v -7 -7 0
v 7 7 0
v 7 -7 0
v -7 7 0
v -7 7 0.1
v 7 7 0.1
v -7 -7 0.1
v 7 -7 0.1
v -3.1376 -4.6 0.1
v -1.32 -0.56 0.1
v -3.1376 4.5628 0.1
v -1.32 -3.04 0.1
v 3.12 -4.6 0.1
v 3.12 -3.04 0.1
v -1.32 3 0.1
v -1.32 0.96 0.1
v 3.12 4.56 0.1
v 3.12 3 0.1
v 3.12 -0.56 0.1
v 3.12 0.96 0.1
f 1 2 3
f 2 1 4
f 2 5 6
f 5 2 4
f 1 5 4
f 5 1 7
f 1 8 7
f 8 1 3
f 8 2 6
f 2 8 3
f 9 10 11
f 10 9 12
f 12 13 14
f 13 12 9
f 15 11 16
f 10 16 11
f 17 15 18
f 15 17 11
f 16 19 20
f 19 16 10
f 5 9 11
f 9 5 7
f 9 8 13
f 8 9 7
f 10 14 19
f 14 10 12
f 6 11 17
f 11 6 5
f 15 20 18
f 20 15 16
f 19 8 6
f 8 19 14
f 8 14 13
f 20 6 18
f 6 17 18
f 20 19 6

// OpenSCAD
// file: ../p/4-4edge.scad
use <../lib.scad>
$fa=1; $fs=0.2;
function ldraw_lib__4_4edge(realsolid=false) = [
// 0 Circle 1.0
// 0 Name: 4-4edge.dat
// 0 Author: James Jessiman
// 0 !LDRAW_ORG Primitive UPDATE 2017-01
// 0 !LICENSE Licensed under CC BY 2.0 and CC BY 4.0 : see CAreadme.txt
// 
// 0 BFC CERTIFY CCW
  [0,"BFC","CERTIFY"],
  [0,"BFC","CCW"],
// 
// 0 !HISTORY 1998-12-15 [PTadmin] Official Update 1998-10
// 0 !HISTORY 2005-12-28 [PTadmin] Official Update 2005-01
// 0 !HISTORY 2007-06-24 [PTadmin] Header formatted for Contributor Agreement
// 0 !HISTORY 2008-07-01 [PTadmin] Official Update 2008-01
// 0 !HISTORY 2017-01-15 [Steffen] BFCed
// 0 !HISTORY 2017-12-30 [PTadmin] Official Update 2017-01
// 
// 
// 2 24 1 0 0 0.9239 0 0.3827
  [2,24,1,0,0,0.9239,0,0.3827],
// 2 24 0.9239 0 0.3827 0.7071 0 0.7071
  [2,24,0.9239,0,0.3827,0.7071,0,0.7071],
// 2 24 0.7071 0 0.7071 0.3827 0 0.9239
  [2,24,0.7071,0,0.7071,0.3827,0,0.9239],
// 2 24 0.3827 0 0.9239 0 0 1
  [2,24,0.3827,0,0.9239,0,0,1],
// 2 24 0 0 1 -0.3827 0 0.9239
  [2,24,0,0,1,-0.3827,0,0.9239],
// 2 24 -0.3827 0 0.9239 -0.7071 0 0.7071
  [2,24,-0.3827,0,0.9239,-0.7071,0,0.7071],
// 2 24 -0.7071 0 0.7071 -0.9239 0 0.3827
  [2,24,-0.7071,0,0.7071,-0.9239,0,0.3827],
// 2 24 -0.9239 0 0.3827 -1 0 -0
  [2,24,-0.9239,0,0.3827,-1,0,-0],
// 2 24 -1 0 -0 -0.9239 0 -0.3827
  [2,24,-1,0,-0,-0.9239,0,-0.3827],
// 2 24 -0.9239 0 -0.3827 -0.7071 0 -0.7071
  [2,24,-0.9239,0,-0.3827,-0.7071,0,-0.7071],
// 2 24 -0.7071 0 -0.7071 -0.3827 0 -0.9239
  [2,24,-0.7071,0,-0.7071,-0.3827,0,-0.9239],
// 2 24 -0.3827 0 -0.9239 0 0 -1
  [2,24,-0.3827,0,-0.9239,0,0,-1],
// 2 24 0 0 -1 0.3827 0 -0.9239
  [2,24,0,0,-1,0.3827,0,-0.9239],
// 2 24 0.3827 0 -0.9239 0.7071 0 -0.7071
  [2,24,0.3827,0,-0.9239,0.7071,0,-0.7071],
// 2 24 0.7071 0 -0.7071 0.9239 0 -0.3827
  [2,24,0.7071,0,-0.7071,0.9239,0,-0.3827],
// 2 24 0.9239 0 -0.3827 1 0 0
  [2,24,0.9239,0,-0.3827,1,0,0],
];
module ldraw_lib__4_4edge(step=0, col=false, unit=2/5, alt=false, line=0.2, solid=!$preview)
    makepoly(ldraw_lib__4_4edge(solid), step=step, col=col, unit=unit, alt=alt, line=line, solid=solid);
ldraw_lib__4_4edge(line=0.2);
// file: ../p/4-4disc.scad
use <../lib.scad>
$fa=1; $fs=0.2;
function ldraw_lib__4_4disc(realsolid=false) = [
// 0 Disc 1.0
// 0 Name: 4-4disc.dat
// 0 Author: James Jessiman
// 0 !LDRAW_ORG Primitive UPDATE 2002-02
// 0 !LICENSE Licensed under CC BY 2.0 and CC BY 4.0 : see CAreadme.txt
// 
// 0 BFC CERTIFY CCW
  [0,"BFC","CERTIFY"],
  [0,"BFC","CCW"],
// 
// 0 !HISTORY 1998-12-15 [PTadmin] Official Update 1998-10
// 0 !HISTORY 2002-03-23 [sbliss] Added BFC statement
// 0 !HISTORY 2002-04-25 [PTadmin] Official Update 2002-02
// 0 !HISTORY 2007-06-24 [PTadmin] Header formatted for Contributor Agreement
// 0 !HISTORY 2008-07-01 [PTadmin] Official Update 2008-01
// 
// 
// 3 16 0 0 0 1 0 0 0.9239 0 0.3827
  [3,16,0,0,0,1,0,0,0.9239,0,0.3827],
// 3 16 0 0 0 0.9239 0 0.3827 0.7071 0 0.7071
  [3,16,0,0,0,0.9239,0,0.3827,0.7071,0,0.7071],
// 3 16 0 0 0 0.7071 0 0.7071 0.3827 0 0.9239
  [3,16,0,0,0,0.7071,0,0.7071,0.3827,0,0.9239],
// 3 16 0 0 0 0.3827 0 0.9239 0 0 1
  [3,16,0,0,0,0.3827,0,0.9239,0,0,1],
// 3 16 0 0 0 0 0 1 -0.3827 0 0.9239
  [3,16,0,0,0,0,0,1,-0.3827,0,0.9239],
// 3 16 0 0 0 -0.3827 0 0.9239 -0.7071 0 0.7071
  [3,16,0,0,0,-0.3827,0,0.9239,-0.7071,0,0.7071],
// 3 16 0 0 0 -0.7071 0 0.7071 -0.9239 0 0.3827
  [3,16,0,0,0,-0.7071,0,0.7071,-0.9239,0,0.3827],
// 3 16 0 0 0 -0.9239 0 0.3827 -1 0 -0
  [3,16,0,0,0,-0.9239,0,0.3827,-1,0,-0],
// 3 16 0 0 0 -1 0 -0 -0.9239 0 -0.3827
  [3,16,0,0,0,-1,0,-0,-0.9239,0,-0.3827],
// 3 16 0 0 0 -0.9239 0 -0.3827 -0.7071 0 -0.7071
  [3,16,0,0,0,-0.9239,0,-0.3827,-0.7071,0,-0.7071],
// 3 16 0 0 0 -0.7071 0 -0.7071 -0.3827 0 -0.9239
  [3,16,0,0,0,-0.7071,0,-0.7071,-0.3827,0,-0.9239],
// 3 16 0 0 0 -0.3827 0 -0.9239 0 0 -1
  [3,16,0,0,0,-0.3827,0,-0.9239,0,0,-1],
// 3 16 0 0 0 0 0 -1 0.3827 0 -0.9239
  [3,16,0,0,0,0,0,-1,0.3827,0,-0.9239],
// 3 16 0 0 0 0.3827 0 -0.9239 0.7071 0 -0.7071
  [3,16,0,0,0,0.3827,0,-0.9239,0.7071,0,-0.7071],
// 3 16 0 0 0 0.7071 0 -0.7071 0.9239 0 -0.3827
  [3,16,0,0,0,0.7071,0,-0.7071,0.9239,0,-0.3827],
// 3 16 0 0 0 0.9239 0 -0.3827 1 0 0
  [3,16,0,0,0,0.9239,0,-0.3827,1,0,0],
// 0
];
module ldraw_lib__4_4disc(step=0, col=false, unit=2/5, alt=false, line=0.2, solid=!$preview)
    makepoly(ldraw_lib__4_4disc(solid), step=step, col=col, unit=unit, alt=alt, line=line, solid=solid);
ldraw_lib__4_4disc(line=0.2);
// file: ../p/4-4cyli.scad
use <../lib.scad>
$fa=1; $fs=0.2;
function ldraw_lib__4_4cyli(realsolid=false) = [
// 0 Cylinder 1.0
// 0 Name: 4-4cyli.dat
// 0 Author: James Jessiman
// 0 !LDRAW_ORG Primitive UPDATE 2005-01
// 0 !LICENSE Licensed under CC BY 2.0 and CC BY 4.0 : see CAreadme.txt
// 
// 0 BFC CERTIFY CCW
  [0,"BFC","CERTIFY"],
  [0,"BFC","CCW"],
// 
// 0 !HISTORY 1998-12-15 [PTadmin] Official Update 1998-10
// 0 !HISTORY 2002-03-23 [sbliss] Added BFC statement; merged headers from files in distributions LDraw 0.27 and Complete.
// 0 !HISTORY 2002-04-25 [PTadmin] Official Update 2002-02
// 0 !HISTORY 2004-12-14 [guyvivan] BFC CCW
// 0 !HISTORY 2005-12-28 [PTadmin] Official Update 2005-01
// 0 !HISTORY 2007-06-24 [PTadmin] Header formatted for Contributor Agreement
// 0 !HISTORY 2008-07-01 [PTadmin] Official Update 2008-01
// 
// 
// 4 16 1 1 0 0.9239 1 0.3827 0.9239 0 0.3827 1 0 0
  [4,16,1,1,0,0.9239,1,0.3827,0.9239,0,0.3827,1,0,0],
// 5 24 1 0 0 1 1 0 0.9239 0 0.3827 0.9239 0 -0.3827
  [5,24,1,0,0,1,1,0,0.9239,0,0.3827,0.9239,0,-0.3827],
// 4 16 0.9239 1 0.3827 0.7071 1 0.7071 0.7071 0 0.7071 0.9239 0 0.3827
  [4,16,0.9239,1,0.3827,0.7071,1,0.7071,0.7071,0,0.7071,0.9239,0,0.3827],
// 5 24 0.9239 0 0.3827 0.9239 1 0.3827 0.7071 0 0.7071 1 0 0
  [5,24,0.9239,0,0.3827,0.9239,1,0.3827,0.7071,0,0.7071,1,0,0],
// 4 16 0.7071 1 0.7071 0.3827 1 0.9239 0.3827 0 0.9239 0.7071 0 0.7071
  [4,16,0.7071,1,0.7071,0.3827,1,0.9239,0.3827,0,0.9239,0.7071,0,0.7071],
// 5 24 0.7071 0 0.7071 0.7071 1 0.7071 0.3827 0 0.9239 0.9239 0 0.3827
  [5,24,0.7071,0,0.7071,0.7071,1,0.7071,0.3827,0,0.9239,0.9239,0,0.3827],
// 4 16 0.3827 1 0.9239 0 1 1 0 0 1 0.3827 0 0.9239
  [4,16,0.3827,1,0.9239,0,1,1,0,0,1,0.3827,0,0.9239],
// 5 24 0.3827 0 0.9239 0.3827 1 0.9239 0 0 1 0.7071 0 0.7071
  [5,24,0.3827,0,0.9239,0.3827,1,0.9239,0,0,1,0.7071,0,0.7071],
// 4 16 0 1 1 -0.3827 1 0.9239 -0.3827 0 0.9239 0 0 1
  [4,16,0,1,1,-0.3827,1,0.9239,-0.3827,0,0.9239,0,0,1],
// 5 24 0 0 1 0 1 1 -0.3827 0 0.9239 0.3827 0 0.9239
  [5,24,0,0,1,0,1,1,-0.3827,0,0.9239,0.3827,0,0.9239],
// 4 16 -0.3827 1 0.9239 -0.7071 1 0.7071 -0.7071 0 0.7071 -0.3827 0 0.9239
  [4,16,-0.3827,1,0.9239,-0.7071,1,0.7071,-0.7071,0,0.7071,-0.3827,0,0.9239],
// 5 24 -0.3827 0 0.9239 -0.3827 1 0.9239 -0.7071 0 0.7071 0 0 1
  [5,24,-0.3827,0,0.9239,-0.3827,1,0.9239,-0.7071,0,0.7071,0,0,1],
// 4 16 -0.7071 1 0.7071 -0.9239 1 0.3827 -0.9239 0 0.3827 -0.7071 0 0.7071
  [4,16,-0.7071,1,0.7071,-0.9239,1,0.3827,-0.9239,0,0.3827,-0.7071,0,0.7071],
// 5 24 -0.7071 0 0.7071 -0.7071 1 0.7071 -0.9239 0 0.3827 -0.3827 0 0.9239
  [5,24,-0.7071,0,0.7071,-0.7071,1,0.7071,-0.9239,0,0.3827,-0.3827,0,0.9239],
// 4 16 -0.9239 1 0.3827 -1 1 0 -1 0 0 -0.9239 0 0.3827
  [4,16,-0.9239,1,0.3827,-1,1,0,-1,0,0,-0.9239,0,0.3827],
// 5 24 -0.9239 0 0.3827 -0.9239 1 0.3827 -1 0 0 -0.7071 0 0.7071
  [5,24,-0.9239,0,0.3827,-0.9239,1,0.3827,-1,0,0,-0.7071,0,0.7071],
// 4 16 -1 1 0 -0.9239 1 -0.3827 -0.9239 0 -0.3827 -1 0 0
  [4,16,-1,1,0,-0.9239,1,-0.3827,-0.9239,0,-0.3827,-1,0,0],
// 5 24 -1 0 0 -1 1 0 -0.9239 0 -0.3827 -0.9239 0 0.3827
  [5,24,-1,0,0,-1,1,0,-0.9239,0,-0.3827,-0.9239,0,0.3827],
// 4 16 -0.9239 1 -0.3827 -0.7071 1 -0.7071 -0.7071 0 -0.7071 -0.9239 0 -0.3827
  [4,16,-0.9239,1,-0.3827,-0.7071,1,-0.7071,-0.7071,0,-0.7071,-0.9239,0,-0.3827],
// 5 24 -0.9239 0 -0.3827 -0.9239 1 -0.3827 -0.7071 0 -0.7071 -1 0 0
  [5,24,-0.9239,0,-0.3827,-0.9239,1,-0.3827,-0.7071,0,-0.7071,-1,0,0],
// 4 16 -0.7071 1 -0.7071 -0.3827 1 -0.9239 -0.3827 0 -0.9239 -0.7071 0 -0.7071
  [4,16,-0.7071,1,-0.7071,-0.3827,1,-0.9239,-0.3827,0,-0.9239,-0.7071,0,-0.7071],
// 5 24 -0.7071 0 -0.7071 -0.7071 1 -0.7071 -0.3827 0 -0.9239 -0.9239 0 -0.3827
  [5,24,-0.7071,0,-0.7071,-0.7071,1,-0.7071,-0.3827,0,-0.9239,-0.9239,0,-0.3827],
// 4 16 -0.3827 1 -0.9239 0 1 -1 0 0 -1 -0.3827 0 -0.9239
  [4,16,-0.3827,1,-0.9239,0,1,-1,0,0,-1,-0.3827,0,-0.9239],
// 5 24 -0.3827 0 -0.9239 -0.3827 1 -0.9239 0 0 -1 -0.7071 0 -0.7071
  [5,24,-0.3827,0,-0.9239,-0.3827,1,-0.9239,0,0,-1,-0.7071,0,-0.7071],
// 4 16 0 1 -1 0.3827 1 -0.9239 0.3827 0 -0.9239 0 0 -1
  [4,16,0,1,-1,0.3827,1,-0.9239,0.3827,0,-0.9239,0,0,-1],
// 5 24 0 0 -1 0 1 -1 0.3827 0 -0.9239 -0.3827 0 -0.9239
  [5,24,0,0,-1,0,1,-1,0.3827,0,-0.9239,-0.3827,0,-0.9239],
// 4 16 0.3827 1 -0.9239 0.7071 1 -0.7071 0.7071 0 -0.7071 0.3827 0 -0.9239
  [4,16,0.3827,1,-0.9239,0.7071,1,-0.7071,0.7071,0,-0.7071,0.3827,0,-0.9239],
// 5 24 0.3827 0 -0.9239 0.3827 1 -0.9239 0.7071 0 -0.7071 0 0 -1
  [5,24,0.3827,0,-0.9239,0.3827,1,-0.9239,0.7071,0,-0.7071,0,0,-1],
// 4 16 0.7071 1 -0.7071 0.9239 1 -0.3827 0.9239 0 -0.3827 0.7071 0 -0.7071
  [4,16,0.7071,1,-0.7071,0.9239,1,-0.3827,0.9239,0,-0.3827,0.7071,0,-0.7071],
// 5 24 0.7071 0 -0.7071 0.7071 1 -0.7071 0.9239 0 -0.3827 0.3827 0 -0.9239
  [5,24,0.7071,0,-0.7071,0.7071,1,-0.7071,0.9239,0,-0.3827,0.3827,0,-0.9239],
// 4 16 0.9239 1 -0.3827 1 1 0 1 0 0 0.9239 0 -0.3827
  [4,16,0.9239,1,-0.3827,1,1,0,1,0,0,0.9239,0,-0.3827],
// 5 24 0.9239 0 -0.3827 0.9239 1 -0.3827 1 0 0 0.7071 0 -0.7071
  [5,24,0.9239,0,-0.3827,0.9239,1,-0.3827,1,0,0,0.7071,0,-0.7071],
// 0
];
module ldraw_lib__4_4cyli(step=0, col=false, unit=2/5, alt=false, line=0.2, solid=!$preview)
    makepoly(ldraw_lib__4_4cyli(solid), step=step, col=col, unit=unit, alt=alt, line=line, solid=solid);
ldraw_lib__4_4cyli(line=0.2);
// file: ../p/stud3.scad
use <../lib.scad>
use <4-4cyli.scad>
use <4-4disc.scad>
use <4-4edge.scad>
$fa=1; $fs=0.2;
function ldraw_lib__stud3(realsolid=false) = realsolid ? 
    [openscad(translate([0,0,-eps()], o=cylinder(4+eps(), r=4)),2)] : [
// 0 Stud Tube Solid
// 0 Name: stud3.dat
// 0 Author: James Jessiman
// 0 !LDRAW_ORG Primitive UPDATE 2012-01
// 0 !LICENSE Licensed under CC BY 2.0 and CC BY 4.0 : see CAreadme.txt
// 
// 0 BFC CERTIFY CCW
  [0,"BFC","CERTIFY"],
  [0,"BFC","CCW"],
// 
// 0 !HISTORY 2002-04-04 [sbliss] Modified for BFC compliance
// 0 !HISTORY 2002-04-25 [PTadmin] Official Update 2002-02
// 0 !HISTORY 2007-06-24 [PTadmin] Header formatted for Contributor Agreement
// 0 !HISTORY 2008-07-01 [PTadmin] Official Update 2008-01
// 0 !HISTORY 2012-02-16 [Philo] Changed to CCW
// 0 !HISTORY 2012-03-30 [PTadmin] Official Update 2012-01
// 
// 
// 1 16 0 -4 0 4 0 0 0 1 0 0 0 4 4-4edge.dat
  [1,16,0,-4,0,4,0,0,0,1,0,0,0,4, ldraw_lib__4_4edge(realsolid)],
// 1 16 0 0 0 4 0 0 0 1 0 0 0 4 4-4edge.dat
  [1,16,0,0,0,4,0,0,0,1,0,0,0,4, ldraw_lib__4_4edge(realsolid)],
// 1 16 0 -4 0 4 0 0 0 1 0 0 0 4 4-4disc.dat
  [1,16,0,-4,0,4,0,0,0,1,0,0,0,4, ldraw_lib__4_4disc(realsolid)],
// 1 16 0 -4 0 4 0 0 0 4 0 0 0 4 4-4cyli.dat
  [1,16,0,-4,0,4,0,0,0,4,0,0,0,4, ldraw_lib__4_4cyli(realsolid)],
];
module ldraw_lib__stud3(step=0, col=false, unit=2/5, alt=false, line=0.2, solid=!$preview)
    makepoly(ldraw_lib__stud3(solid), step=step, col=col, unit=unit, alt=alt, line=line, solid=solid);
ldraw_lib__stud3(line=0.2);
// file: ../p/stud.scad
use <../lib.scad>
use <4-4cyli.scad>
use <4-4disc.scad>
use <4-4edge.scad>
$fa=1; $fs=0.2;
function ldraw_lib__stud(realsolid=false) = realsolid ? 
    [openscad(translate([0,0,-eps()], o=cylinder(4+eps(), r=6)),2)] : [
// 0 Stud
// 0 Name: stud.dat
// 0 Author: James Jessiman
// 0 !LDRAW_ORG Primitive UPDATE 2012-01
// 0 !LICENSE Licensed under CC BY 2.0 and CC BY 4.0 : see CAreadme.txt
// 
// 0 BFC CERTIFY CCW
  [0,"BFC","CERTIFY"],
  [0,"BFC","CCW"],
// 
// 0 !HISTORY 2002-04-04 [sbliss] Modified for BFC compliance
// 0 !HISTORY 2002-04-25 [PTadmin] Official Update 2002-02
// 0 !HISTORY 2007-06-24 [PTadmin] Header formatted for Contributor Agreement
// 0 !HISTORY 2008-07-01 [PTadmin] Official Update 2008-01
// 0 !HISTORY 2012-02-16 [Philo] Changed to CCW
// 0 !HISTORY 2012-03-30 [PTadmin] Official Update 2012-01
// 
// 
// 1 16 0 0 0 6 0 0 0 1 0 0 0 6 4-4edge.dat
  [1,16,0,0,0,6,0,0,0,1,0,0,0,6, ldraw_lib__4_4edge(realsolid)],
// 1 16 0 -4 0 6 0 0 0 1 0 0 0 6 4-4edge.dat
  [1,16,0,-4,0,6,0,0,0,1,0,0,0,6, ldraw_lib__4_4edge(realsolid)],
// 1 16 0 0 0 6 0 0 0 -4 0 0 0 6 4-4cyli.dat
  [1,16,0,0,0,6,0,0,0,-4,0,0,0,6, ldraw_lib__4_4cyli(realsolid)],
// 1 16 0 -4 0 6 0 0 0 1 0 0 0 6 4-4disc.dat
  [1,16,0,-4,0,6,0,0,0,1,0,0,0,6, ldraw_lib__4_4disc(realsolid)],
];
module ldraw_lib__stud(step=0, col=false, unit=2/5, alt=false, line=0.2, solid=!$preview)
    makepoly(ldraw_lib__stud(solid), step=step, col=col, unit=unit, alt=alt, line=line, solid=solid);
ldraw_lib__stud(line=0.2);
// file: ../p/box5.scad
use <../lib.scad>
$fa=1; $fs=0.2;
function ldraw_lib__box5(realsolid=false) = [
// 0 Box with 5 Faces and All Edges
// 0 Name: box5.dat
// 0 Author: James Jessiman
// 0 !LDRAW_ORG Primitive UPDATE 2012-01
// 0 !LICENSE Licensed under CC BY 2.0 and CC BY 4.0 : see CAreadme.txt
// 
// 0 BFC CERTIFY CCW
  [0,"BFC","CERTIFY"],
  [0,"BFC","CCW"],
// 
// 0 !HISTORY 2002-04-03 [sbliss] Modified for BFC compliance
// 0 !HISTORY 2002-04-25 [PTadmin] Official Update 2002-02
// 0 !HISTORY 2007-06-24 [PTadmin] Header formatted for Contributor Agreement
// 0 !HISTORY 2008-07-01 [PTadmin] Official Update 2008-01
// 0 !HISTORY 2012-02-16 [Philo] Changed to CCW
// 0 !HISTORY 2012-03-30 [PTadmin] Official Update 2012-01
// 
// 
// 2 24 1 1 1 -1 1 1
  [2,24,1,1,1,-1,1,1],
// 2 24 -1 1 1 -1 1 -1
  [2,24,-1,1,1,-1,1,-1],
// 2 24 -1 1 -1 1 1 -1
  [2,24,-1,1,-1,1,1,-1],
// 2 24 1 1 -1 1 1 1
  [2,24,1,1,-1,1,1,1],
// 2 24 1 0 1 -1 0 1
  [2,24,1,0,1,-1,0,1],
// 2 24 -1 0 1 -1 0 -1
  [2,24,-1,0,1,-1,0,-1],
// 2 24 -1 0 -1 1 0 -1
  [2,24,-1,0,-1,1,0,-1],
// 2 24 1 0 -1 1 0 1
  [2,24,1,0,-1,1,0,1],
// 2 24 1 0 1 1 1 1
  [2,24,1,0,1,1,1,1],
// 2 24 -1 0 1 -1 1 1
  [2,24,-1,0,1,-1,1,1],
// 2 24 1 0 -1 1 1 -1
  [2,24,1,0,-1,1,1,-1],
// 2 24 -1 0 -1 -1 1 -1
  [2,24,-1,0,-1,-1,1,-1],
// 4 16 -1 1 1 1 1 1 1 1 -1 -1 1 -1
  [4,16,-1,1,1,1,1,1,1,1,-1,-1,1,-1],
// 4 16 -1 1 1 -1 0 1 1 0 1 1 1 1
  [4,16,-1,1,1,-1,0,1,1,0,1,1,1,1],
// 4 16 -1 1 -1 -1 0 -1 -1 0 1 -1 1 1
  [4,16,-1,1,-1,-1,0,-1,-1,0,1,-1,1,1],
// 4 16 1 1 -1 1 0 -1 -1 0 -1 -1 1 -1
  [4,16,1,1,-1,1,0,-1,-1,0,-1,-1,1,-1],
// 4 16 1 1 1 1 0 1 1 0 -1 1 1 -1
  [4,16,1,1,1,1,0,1,1,0,-1,1,1,-1],
];
module ldraw_lib__box5(step=0, col=false, unit=2/5, alt=false, line=0.2, solid=!$preview)
    makepoly(ldraw_lib__box5(solid), step=step, col=col, unit=unit, alt=alt, line=line, solid=solid);
ldraw_lib__box5(line=0.2);
// file: ../p/box4t.scad
use <../lib.scad>
$fa=1; $fs=0.2;
function ldraw_lib__box4t(realsolid=false) = [
// 0 Box with 4 Adjacent Faces and All Edges
// 0 Name: box4t.dat
// 0 Author: Tore Eriksson [Tore_Eriksson]
// 0 !LDRAW_ORG Primitive UPDATE 2003-02
// 0 !LICENSE Licensed under CC BY 2.0 and CC BY 4.0 : see CAreadme.txt
// 
// 0 BFC CERTIFY CCW
  [0,"BFC","CERTIFY"],
  [0,"BFC","CCW"],
// 
// 0 !HISTORY 1997-09-29 [PTadmin] Official Update 1997-15
// 0 !HISTORY 2002-08-31 [izanette] Modified with WINDZ for BFC compliance
// 0 !HISTORY 2003-08-01 [PTadmin] Official Update 2003-02
// 0 !HISTORY 2007-06-24 [PTadmin] Header formatted for Contributor Agreement
// 0 !HISTORY 2008-07-01 [PTadmin] Official Update 2008-01
// 
// 
// 2 24 1 1 1 -1 1 1
  [2,24,1,1,1,-1,1,1],
// 2 24 -1 1 1 -1 1 -1
  [2,24,-1,1,1,-1,1,-1],
// 2 24 -1 1 -1 1 1 -1
  [2,24,-1,1,-1,1,1,-1],
// 2 24 1 1 -1 1 1 1
  [2,24,1,1,-1,1,1,1],
// 2 24 1 0 1 -1 0 1
  [2,24,1,0,1,-1,0,1],
// 2 24 -1 0 1 -1 0 -1
  [2,24,-1,0,1,-1,0,-1],
// 2 24 -1 0 -1 1 0 -1
  [2,24,-1,0,-1,1,0,-1],
// 2 24 1 0 -1 1 0 1
  [2,24,1,0,-1,1,0,1],
// 2 24 1 0 1 1 1 1
  [2,24,1,0,1,1,1,1],
// 2 24 -1 0 1 -1 1 1
  [2,24,-1,0,1,-1,1,1],
// 2 24 1 0 -1 1 1 -1
  [2,24,1,0,-1,1,1,-1],
// 2 24 -1 0 -1 -1 1 -1
  [2,24,-1,0,-1,-1,1,-1],
// 4 16 1 1 1 1 1 -1 -1 1 -1 -1 1 1
  [4,16,1,1,1,1,1,-1,-1,1,-1,-1,1,1],
// 4 16 1 1 1 -1 1 1 -1 0 1 1 0 1
  [4,16,1,1,1,-1,1,1,-1,0,1,1,0,1],
// 4 16 -1 1 1 -1 1 -1 -1 0 -1 -1 0 1
  [4,16,-1,1,1,-1,1,-1,-1,0,-1,-1,0,1],
// 0 4 16 -1 1 -1 -1 0 -1 1 0 -1 1 1 -1
// 4 16 1 1 -1 1 1 1 1 0 1 1 0 -1
  [4,16,1,1,-1,1,1,1,1,0,1,1,0,-1],
// 0
];
module ldraw_lib__box4t(step=0, col=false, unit=2/5, alt=false, line=0.2, solid=!$preview)
    makepoly(ldraw_lib__box4t(solid), step=step, col=col, unit=unit, alt=alt, line=line, solid=solid);
ldraw_lib__box4t(line=0.2);
// file: s/3004s01.scad
use <../../lib.scad>
use <../../p/box4t.scad>
use <../../p/box5.scad>
use <../../p/stud.scad>
use <../../p/stud3.scad>
$fa=1; $fs=0.2;
function ldraw_lib__s__3004s01(realsolid=false) = [
// 0 ~Brick  1 x  2 without Front Face
// 0 Name: s\3004s01.dat
// 0 Author: James Jessiman
// 0 !LDRAW_ORG Subpart UPDATE 2003-03
// 0 !LICENSE Licensed under CC BY 2.0 and CC BY 4.0 : see CAreadme.txt
// 
// 0 BFC CERTIFY CCW
  [0,"BFC","CERTIFY"],
  [0,"BFC","CCW"],
// 
// 0 !HISTORY 2003-09-07 [jriley] Subfiling, BFC
// 0 !HISTORY 2003-12-19 [PTadmin] Official Update 2003-03
// 0 !HISTORY 2007-08-29 [PTadmin] Header formatted for Contributor Agreement
// 0 !HISTORY 2008-07-01 [PTadmin] Official Update 2008-01
// 
// 
// 1 16 0 4 0 1 0 0 0 -5 0 0 0 1 stud3.dat
  [1,16,0,4,0,1,0,0,0,-5,0,0,0,1, ldraw_lib__stud3(realsolid)],
// 0 BFC INVERTNEXT
  [0,"BFC","INVERTNEXT"],
// 1 16 0 24 0 16 0 0 0 -20 0 0 0 6 box5.dat
  [1,16,0,24,0,16,0,0,0,-20,0,0,0,6, ldraw_lib__box5(realsolid)],
// 4 16 20 24 10 16 24 6 -16 24 6 -20 24 10
  [4,16,20,24,10,16,24,6,-16,24,6,-20,24,10],
// 4 16 -20 24 10 -16 24 6 -16 24 -6 -20 24 -10
  [4,16,-20,24,10,-16,24,6,-16,24,-6,-20,24,-10],
// 4 16 -20 24 -10 -16 24 -6 16 24 -6 20 24 -10
  [4,16,-20,24,-10,-16,24,-6,16,24,-6,20,24,-10],
// 4 16 20 24 -10 16 24 -6 16 24 6 20 24 10
  [4,16,20,24,-10,16,24,-6,16,24,6,20,24,10],
// 1 16 0 24 0 20 0 0 0 -24 0 0 0 10 box4t.dat
  [1,16,0,24,0,20,0,0,0,-24,0,0,0,10, ldraw_lib__box4t(realsolid)],
// 1 16 10 0 0 1 0 0 0 1 0 0 0 1 stud.dat
  [1,16,10,0,0,1,0,0,0,1,0,0,0,1, ldraw_lib__stud(realsolid)],
// 1 16 -10 0 0 1 0 0 0 1 0 0 0 1 stud.dat
  [1,16,-10,0,0,1,0,0,0,1,0,0,0,1, ldraw_lib__stud(realsolid)],
// 0
];
module ldraw_lib__s__3004s01(step=0, col=false, unit=2/5, alt=false, line=0.2, solid=!$preview)
    makepoly(ldraw_lib__s__3004s01(solid), step=step, col=col, unit=unit, alt=alt, line=line, solid=solid);
ldraw_lib__s__3004s01(line=0.2);
// file: 3004.scad
use <../lib.scad>
use <s/3004s01.scad>
$fa=1; $fs=0.2;
function ldraw_lib__3004(realsolid=false) = [
// 0 Brick  1 x  2
// 0 Name: 3004.dat
// 0 Author: James Jessiman
// 0 !LDRAW_ORG Part UPDATE 2022-05
// 0 !LICENSE Licensed under CC BY 2.0 and CC BY 4.0 : see CAreadme.txt
// 
// 0 BFC CERTIFY CCW
  [0,"BFC","CERTIFY"],
  [0,"BFC","CCW"],
// 
// 0 !HISTORY 2001-10-26 [PTadmin] Official Update 2001-01
// 0 !HISTORY 2002-05-07 {unknown} BFC Certification
// 0 !HISTORY 2002-06-11 [PTadmin] Official Update 2002-03
// 0 !HISTORY 2007-05-07 [PTadmin] Header formatted for Contributor Agreement
// 0 !HISTORY 2008-07-01 [PTadmin] Official Update 2008-01
// 0 !HISTORY 2022-08-04 [MagFors] Using subfile
// 0 !HISTORY 2022-09-15 [PTadmin] Official Update 2022-05
// 
// 
// 1 16 0 0 0 1 0 0 0 1 0 0 0 1 s\3004s01.dat
  [1,16,0,0,0,1,0,0,0,1,0,0,0,1, ldraw_lib__s__3004s01(realsolid)],
// 4 16 -20 24 -10 20 24 -10 20 0 -10 -20 0 -10
  [4,16,-20,24,-10,20,24,-10,20,0,-10,-20,0,-10],
];
module ldraw_lib__3004(step=0, col=false, unit=2/5, alt=false, line=0.2, solid=!$preview)
    makepoly(ldraw_lib__3004(solid), step=step, col=col, unit=unit, alt=alt, line=line, solid=solid);
ldraw_lib__3004(line=0.2);
// file: ../p/box5-12.scad
use <../lib.scad>
$fa=1; $fs=0.2;
function ldraw_lib__box5_12(realsolid=false) = [
// 0 Box with 5 Faces without Any Edges
// 0 Name: box5-12.dat
// 0 Author: Chris Dee [cwdee]
// 0 !LDRAW_ORG Primitive UPDATE 2009-02
// 0 !LICENSE Licensed under CC BY 2.0 and CC BY 4.0 : see CAreadme.txt
// 
// 0 BFC CERTIFY CCW
  [0,"BFC","CERTIFY"],
  [0,"BFC","CCW"],
// 
// 0 !HISTORY 2009-09-03 [PTadmin] Official Update 2009-02
// 
// 
// 4 16 1 1 1 1 1 -1 -1 1 -1 -1 1 1
  [4,16,1,1,1,1,1,-1,-1,1,-1,-1,1,1],
// 4 16 -1 0 1 1 0 1 1 1 1 -1 1 1
  [4,16,-1,0,1,1,0,1,1,1,1,-1,1,1],
// 4 16 -1 0 -1 -1 0 1 -1 1 1 -1 1 -1
  [4,16,-1,0,-1,-1,0,1,-1,1,1,-1,1,-1],
// 4 16 1 0 -1 -1 0 -1 -1 1 -1 1 1 -1
  [4,16,1,0,-1,-1,0,-1,-1,1,-1,1,1,-1],
// 4 16 1 0 1 1 0 -1 1 1 -1 1 1 1
  [4,16,1,0,1,1,0,-1,1,1,-1,1,1,1],
// 0
];
module ldraw_lib__box5_12(step=0, col=false, unit=2/5, alt=false, line=0.2, solid=!$preview)
    makepoly(ldraw_lib__box5_12(solid), step=step, col=col, unit=unit, alt=alt, line=line, solid=solid);
ldraw_lib__box5_12(line=0.2);
// main file
use <../lib.scad>
use <../p/box5-12.scad>
$fa=1; $fs=0.2;
function ldraw_lib__4521703r(realsolid=false) = [
// 0 Sticker  1.7 x  1.7 with Dark_Red "E"
// 0 Name: 4521703r.dat
// 0 Author: J.C. Tchang [tchang]
// 0 !LDRAW_ORG Part UPDATE 2011-01
// 0 !LICENSE Licensed under CC BY 2.0 and CC BY 4.0 : see CAreadme.txt
// 
// 0 BFC CERTIFY CCW
  [0,"BFC","CERTIFY"],
  [0,"BFC","CCW"],
// 
// 0 !HISTORY 2011-07-25 [PTadmin] Official Update 2011-01
// 
// 
// 1 15 0 -0.25 0 17.5 0 0 0 0.25 0 0 0 17.5 box5-12.dat
  [1,15,0,-0.25,0,17.5,0,0,0,0.25,0,0,0,17.5, ldraw_lib__box5_12(realsolid)],
// 0 //
// 4 320 -7.844 -0.25 -11.5 -3.3 -0.25 -7.6 -3.3 -0.25 -1.4 -7.844 -0.25 11.407
  [4,320,-7.844,-0.25,-11.5,-3.3,-0.25,-7.6,-3.3,-0.25,-1.4,-7.844,-0.25,11.407],
// 4 320 -3.3 -0.25 -7.6 -7.844 -0.25 -11.5 7.8 -0.25 -11.5 7.8 -0.25 -7.6
  [4,320,-3.3,-0.25,-7.6,-7.844,-0.25,-11.5,7.8,-0.25,-11.5,7.8,-0.25,-7.6],
// 3 320 -3.3 -0.25 7.5 -7.844 -0.25 11.407 -3.3 -0.25 2.4
  [3,320,-3.3,-0.25,7.5,-7.844,-0.25,11.407,-3.3,-0.25,2.4],
// 3 320 -3.3 -0.25 -1.4 -3.3 -0.25 2.4 -7.844 -0.25 11.407
  [3,320,-3.3,-0.25,-1.4,-3.3,-0.25,2.4,-7.844,-0.25,11.407],
// 4 320 7.8 -0.25 11.4 -7.844 -0.25 11.407 -3.3 -0.25 7.5 7.8 -0.25 7.5
  [4,320,7.8,-0.25,11.4,-7.844,-0.25,11.407,-3.3,-0.25,7.5,7.8,-0.25,7.5],
// 4 320 -3.3 -0.25 2.4 -3.3 -0.25 -1.4 7.8 -0.25 -1.4 7.8 -0.25 2.4
  [4,320,-3.3,-0.25,2.4,-3.3,-0.25,-1.4,7.8,-0.25,-1.4,7.8,-0.25,2.4],
// 0 //
// 4 15 -17.5 -0.25 17.5 -17.5 -0.25 -17.5 -7.844 -0.25 -11.5 -7.844 -0.25 11.407
  [4,15,-17.5,-0.25,17.5,-17.5,-0.25,-17.5,-7.844,-0.25,-11.5,-7.844,-0.25,11.407],
// 4 15 -7.844 -0.25 -11.5 -17.5 -0.25 -17.5 17.5 -0.25 -17.5 7.8 -0.25 -11.5
  [4,15,-7.844,-0.25,-11.5,-17.5,-0.25,-17.5,17.5,-0.25,-17.5,7.8,-0.25,-11.5],
// 4 15 7.8 -0.25 -1.4 -3.3 -0.25 -1.4 -3.3 -0.25 -7.6 7.8 -0.25 -7.6
  [4,15,7.8,-0.25,-1.4,-3.3,-0.25,-1.4,-3.3,-0.25,-7.6,7.8,-0.25,-7.6],
// 4 15 17.5 -0.25 17.5 -17.5 -0.25 17.5 -7.844 -0.25 11.407 7.8 -0.25 11.4
  [4,15,17.5,-0.25,17.5,-17.5,-0.25,17.5,-7.844,-0.25,11.407,7.8,-0.25,11.4],
// 4 15 -3.3 -0.25 7.5 -3.3 -0.25 2.4 7.8 -0.25 2.4 7.8 -0.25 7.5
  [4,15,-3.3,-0.25,7.5,-3.3,-0.25,2.4,7.8,-0.25,2.4,7.8,-0.25,7.5],
// 4 15 7.8 -0.25 -1.4 7.8 -0.25 -7.6 17.5 -0.25 -17.5 17.5 -0.25 17.5
  [4,15,7.8,-0.25,-1.4,7.8,-0.25,-7.6,17.5,-0.25,-17.5,17.5,-0.25,17.5],
// 3 15 17.5 -0.25 -17.5 7.8 -0.25 -7.6 7.8 -0.25 -11.5
  [3,15,17.5,-0.25,-17.5,7.8,-0.25,-7.6,7.8,-0.25,-11.5],
// 3 15 7.8 -0.25 2.4 17.5 -0.25 17.5 7.8 -0.25 7.5
  [3,15,7.8,-0.25,2.4,17.5,-0.25,17.5,7.8,-0.25,7.5],
// 3 15 17.5 -0.25 17.5 7.8 -0.25 11.4 7.8 -0.25 7.5
  [3,15,17.5,-0.25,17.5,7.8,-0.25,11.4,7.8,-0.25,7.5],
// 3 15 7.8 -0.25 2.4 7.8 -0.25 -1.4 17.5 -0.25 17.5
  [3,15,7.8,-0.25,2.4,7.8,-0.25,-1.4,17.5,-0.25,17.5],
// 0 //
];
module ldraw_lib__4521703r(step=0, col=false, unit=2/5, alt=false, line=0.2, solid=!$preview)
    makepoly(ldraw_lib__4521703r(solid), step=step, col=col, unit=unit, alt=alt, line=line, solid=solid);
ldraw_lib__4521703r(line=0.2);
